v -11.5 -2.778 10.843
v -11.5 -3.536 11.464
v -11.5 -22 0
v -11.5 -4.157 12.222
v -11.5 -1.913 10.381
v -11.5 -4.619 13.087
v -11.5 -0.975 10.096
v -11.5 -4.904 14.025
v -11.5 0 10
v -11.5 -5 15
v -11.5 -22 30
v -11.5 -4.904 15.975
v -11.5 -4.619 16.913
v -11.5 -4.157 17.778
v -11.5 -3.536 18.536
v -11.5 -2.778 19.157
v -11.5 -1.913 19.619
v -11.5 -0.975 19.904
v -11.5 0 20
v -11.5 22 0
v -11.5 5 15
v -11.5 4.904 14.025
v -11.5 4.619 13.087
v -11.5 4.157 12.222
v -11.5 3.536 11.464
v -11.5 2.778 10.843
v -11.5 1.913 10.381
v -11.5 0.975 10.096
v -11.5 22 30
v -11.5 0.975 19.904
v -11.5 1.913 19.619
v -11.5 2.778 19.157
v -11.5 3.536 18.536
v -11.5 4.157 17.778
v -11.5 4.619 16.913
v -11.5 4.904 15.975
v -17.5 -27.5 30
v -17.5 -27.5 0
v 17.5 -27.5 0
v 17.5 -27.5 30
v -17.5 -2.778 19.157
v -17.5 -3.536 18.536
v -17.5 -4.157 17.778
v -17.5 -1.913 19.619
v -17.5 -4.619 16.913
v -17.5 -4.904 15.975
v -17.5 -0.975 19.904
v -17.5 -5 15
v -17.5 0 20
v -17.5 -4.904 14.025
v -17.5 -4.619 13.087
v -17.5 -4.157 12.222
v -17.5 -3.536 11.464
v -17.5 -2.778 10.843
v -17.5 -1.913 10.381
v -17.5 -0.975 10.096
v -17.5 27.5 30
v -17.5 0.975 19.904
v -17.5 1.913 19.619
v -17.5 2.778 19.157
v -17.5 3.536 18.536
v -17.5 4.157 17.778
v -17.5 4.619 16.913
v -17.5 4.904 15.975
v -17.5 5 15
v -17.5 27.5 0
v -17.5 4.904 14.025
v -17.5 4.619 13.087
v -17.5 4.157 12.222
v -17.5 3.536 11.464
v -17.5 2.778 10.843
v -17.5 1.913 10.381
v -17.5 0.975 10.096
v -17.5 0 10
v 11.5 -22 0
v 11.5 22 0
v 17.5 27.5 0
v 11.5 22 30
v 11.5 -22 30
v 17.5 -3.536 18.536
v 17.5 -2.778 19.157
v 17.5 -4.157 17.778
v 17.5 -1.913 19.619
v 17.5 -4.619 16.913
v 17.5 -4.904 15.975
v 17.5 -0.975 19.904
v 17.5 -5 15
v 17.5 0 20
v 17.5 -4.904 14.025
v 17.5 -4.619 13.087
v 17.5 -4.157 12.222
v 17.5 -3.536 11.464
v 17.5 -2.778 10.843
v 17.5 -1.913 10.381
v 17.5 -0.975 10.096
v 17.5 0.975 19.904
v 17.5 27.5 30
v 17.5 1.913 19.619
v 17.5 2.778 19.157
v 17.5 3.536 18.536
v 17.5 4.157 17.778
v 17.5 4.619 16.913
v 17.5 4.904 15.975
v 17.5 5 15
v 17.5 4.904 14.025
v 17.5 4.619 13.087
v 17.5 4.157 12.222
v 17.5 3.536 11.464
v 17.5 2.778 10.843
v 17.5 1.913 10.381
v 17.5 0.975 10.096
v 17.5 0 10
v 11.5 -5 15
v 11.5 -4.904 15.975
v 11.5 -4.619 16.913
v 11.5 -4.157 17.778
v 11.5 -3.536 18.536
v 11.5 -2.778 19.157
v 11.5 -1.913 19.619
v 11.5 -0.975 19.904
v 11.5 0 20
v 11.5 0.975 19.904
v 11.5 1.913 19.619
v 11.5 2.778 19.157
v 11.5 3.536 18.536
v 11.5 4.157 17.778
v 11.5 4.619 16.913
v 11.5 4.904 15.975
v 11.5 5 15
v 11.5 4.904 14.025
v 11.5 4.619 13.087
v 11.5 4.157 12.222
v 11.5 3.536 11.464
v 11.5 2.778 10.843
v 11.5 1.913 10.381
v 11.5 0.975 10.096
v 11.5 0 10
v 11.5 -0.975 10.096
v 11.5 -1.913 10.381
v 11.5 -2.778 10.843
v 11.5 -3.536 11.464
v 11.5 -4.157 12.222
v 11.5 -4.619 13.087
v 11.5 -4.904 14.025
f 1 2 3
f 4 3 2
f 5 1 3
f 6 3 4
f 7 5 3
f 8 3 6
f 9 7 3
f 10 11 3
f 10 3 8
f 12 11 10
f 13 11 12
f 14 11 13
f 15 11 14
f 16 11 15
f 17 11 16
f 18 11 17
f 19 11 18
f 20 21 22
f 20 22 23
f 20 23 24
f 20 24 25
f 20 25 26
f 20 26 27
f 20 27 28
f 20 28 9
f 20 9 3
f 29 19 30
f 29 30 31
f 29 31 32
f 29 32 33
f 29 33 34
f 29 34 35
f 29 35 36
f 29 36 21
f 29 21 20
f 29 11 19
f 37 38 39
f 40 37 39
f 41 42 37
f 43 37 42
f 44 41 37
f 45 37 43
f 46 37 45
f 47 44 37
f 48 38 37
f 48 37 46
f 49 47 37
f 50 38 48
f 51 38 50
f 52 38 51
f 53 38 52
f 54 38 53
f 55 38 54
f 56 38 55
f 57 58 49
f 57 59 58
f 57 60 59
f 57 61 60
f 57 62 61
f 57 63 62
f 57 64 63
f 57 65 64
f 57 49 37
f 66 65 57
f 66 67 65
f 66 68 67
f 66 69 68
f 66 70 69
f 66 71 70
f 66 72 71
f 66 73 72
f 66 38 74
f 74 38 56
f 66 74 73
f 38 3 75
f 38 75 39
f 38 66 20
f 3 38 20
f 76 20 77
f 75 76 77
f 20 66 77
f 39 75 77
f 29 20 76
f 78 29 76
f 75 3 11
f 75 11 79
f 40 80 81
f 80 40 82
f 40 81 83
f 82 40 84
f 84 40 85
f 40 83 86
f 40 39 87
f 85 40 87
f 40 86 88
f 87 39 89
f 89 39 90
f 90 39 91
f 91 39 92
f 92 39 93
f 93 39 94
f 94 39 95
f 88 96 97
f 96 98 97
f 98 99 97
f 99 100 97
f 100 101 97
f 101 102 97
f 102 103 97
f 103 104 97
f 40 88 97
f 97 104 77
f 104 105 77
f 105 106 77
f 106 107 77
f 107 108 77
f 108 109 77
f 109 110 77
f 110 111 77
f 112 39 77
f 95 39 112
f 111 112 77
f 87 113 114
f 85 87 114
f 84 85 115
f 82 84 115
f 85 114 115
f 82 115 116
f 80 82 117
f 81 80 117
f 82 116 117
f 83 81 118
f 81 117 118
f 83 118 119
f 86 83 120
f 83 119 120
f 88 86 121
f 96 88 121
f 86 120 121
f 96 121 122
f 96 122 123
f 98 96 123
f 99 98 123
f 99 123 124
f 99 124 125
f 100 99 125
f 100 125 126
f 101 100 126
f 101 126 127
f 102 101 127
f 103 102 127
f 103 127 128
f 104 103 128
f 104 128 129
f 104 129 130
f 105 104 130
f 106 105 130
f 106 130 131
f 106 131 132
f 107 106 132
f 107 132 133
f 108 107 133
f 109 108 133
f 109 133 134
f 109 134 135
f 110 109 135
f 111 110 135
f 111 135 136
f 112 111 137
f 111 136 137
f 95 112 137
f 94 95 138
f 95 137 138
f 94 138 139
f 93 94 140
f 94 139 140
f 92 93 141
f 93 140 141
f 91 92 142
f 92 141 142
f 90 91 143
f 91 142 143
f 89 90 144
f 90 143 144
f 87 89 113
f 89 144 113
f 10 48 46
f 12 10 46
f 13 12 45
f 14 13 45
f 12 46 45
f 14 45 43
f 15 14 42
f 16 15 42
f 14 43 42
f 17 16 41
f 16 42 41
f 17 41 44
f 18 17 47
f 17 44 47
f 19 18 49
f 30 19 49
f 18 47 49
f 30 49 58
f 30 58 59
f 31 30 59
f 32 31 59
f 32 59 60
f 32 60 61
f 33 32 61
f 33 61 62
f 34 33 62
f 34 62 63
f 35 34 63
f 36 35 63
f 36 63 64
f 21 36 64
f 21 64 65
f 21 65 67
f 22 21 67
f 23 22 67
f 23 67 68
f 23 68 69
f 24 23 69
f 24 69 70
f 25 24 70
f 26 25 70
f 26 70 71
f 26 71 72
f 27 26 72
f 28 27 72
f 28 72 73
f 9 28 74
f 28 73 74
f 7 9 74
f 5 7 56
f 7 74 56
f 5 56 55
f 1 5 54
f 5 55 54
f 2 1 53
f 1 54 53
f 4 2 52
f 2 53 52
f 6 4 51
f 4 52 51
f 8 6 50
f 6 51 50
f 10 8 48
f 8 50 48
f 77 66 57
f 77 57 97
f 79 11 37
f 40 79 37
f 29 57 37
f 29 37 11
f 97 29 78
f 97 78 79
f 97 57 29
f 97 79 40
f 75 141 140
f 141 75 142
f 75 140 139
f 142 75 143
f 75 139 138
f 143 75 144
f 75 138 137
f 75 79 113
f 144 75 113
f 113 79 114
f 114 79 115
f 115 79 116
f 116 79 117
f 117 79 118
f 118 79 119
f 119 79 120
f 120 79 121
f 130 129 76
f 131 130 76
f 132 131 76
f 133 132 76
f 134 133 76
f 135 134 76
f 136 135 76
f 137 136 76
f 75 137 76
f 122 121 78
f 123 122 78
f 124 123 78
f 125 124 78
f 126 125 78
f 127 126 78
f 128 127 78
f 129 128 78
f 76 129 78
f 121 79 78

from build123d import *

# Parameters (mm, degrees)
F0_W     = 35
F0_H     = 55
F1_DEPTH = 30
F3_W     = 23
F3_H     = 44
F4_DEPTH = 40
F6_D     = 10


with BuildPart() as f1:
    # F0 (on Top) → F1 (new body)
    with BuildSketch(Plane.XY):
        Rectangle(F0_W, F0_H)
    extrude(amount=F1_DEPTH)

    # F3 (on face) → F4 (cut)
    with BuildSketch(Plane.XY.offset(30)):
        Rectangle(F3_W, F3_H)
    extrude(amount=-F4_DEPTH, mode=Mode.SUBTRACT)

    # F6 (through all)
    with Locations(Plane.YZ.offset(17.5)):
        with Locations((0, 15)):
            Hole(F6_D / 2)


solid = f1.part
